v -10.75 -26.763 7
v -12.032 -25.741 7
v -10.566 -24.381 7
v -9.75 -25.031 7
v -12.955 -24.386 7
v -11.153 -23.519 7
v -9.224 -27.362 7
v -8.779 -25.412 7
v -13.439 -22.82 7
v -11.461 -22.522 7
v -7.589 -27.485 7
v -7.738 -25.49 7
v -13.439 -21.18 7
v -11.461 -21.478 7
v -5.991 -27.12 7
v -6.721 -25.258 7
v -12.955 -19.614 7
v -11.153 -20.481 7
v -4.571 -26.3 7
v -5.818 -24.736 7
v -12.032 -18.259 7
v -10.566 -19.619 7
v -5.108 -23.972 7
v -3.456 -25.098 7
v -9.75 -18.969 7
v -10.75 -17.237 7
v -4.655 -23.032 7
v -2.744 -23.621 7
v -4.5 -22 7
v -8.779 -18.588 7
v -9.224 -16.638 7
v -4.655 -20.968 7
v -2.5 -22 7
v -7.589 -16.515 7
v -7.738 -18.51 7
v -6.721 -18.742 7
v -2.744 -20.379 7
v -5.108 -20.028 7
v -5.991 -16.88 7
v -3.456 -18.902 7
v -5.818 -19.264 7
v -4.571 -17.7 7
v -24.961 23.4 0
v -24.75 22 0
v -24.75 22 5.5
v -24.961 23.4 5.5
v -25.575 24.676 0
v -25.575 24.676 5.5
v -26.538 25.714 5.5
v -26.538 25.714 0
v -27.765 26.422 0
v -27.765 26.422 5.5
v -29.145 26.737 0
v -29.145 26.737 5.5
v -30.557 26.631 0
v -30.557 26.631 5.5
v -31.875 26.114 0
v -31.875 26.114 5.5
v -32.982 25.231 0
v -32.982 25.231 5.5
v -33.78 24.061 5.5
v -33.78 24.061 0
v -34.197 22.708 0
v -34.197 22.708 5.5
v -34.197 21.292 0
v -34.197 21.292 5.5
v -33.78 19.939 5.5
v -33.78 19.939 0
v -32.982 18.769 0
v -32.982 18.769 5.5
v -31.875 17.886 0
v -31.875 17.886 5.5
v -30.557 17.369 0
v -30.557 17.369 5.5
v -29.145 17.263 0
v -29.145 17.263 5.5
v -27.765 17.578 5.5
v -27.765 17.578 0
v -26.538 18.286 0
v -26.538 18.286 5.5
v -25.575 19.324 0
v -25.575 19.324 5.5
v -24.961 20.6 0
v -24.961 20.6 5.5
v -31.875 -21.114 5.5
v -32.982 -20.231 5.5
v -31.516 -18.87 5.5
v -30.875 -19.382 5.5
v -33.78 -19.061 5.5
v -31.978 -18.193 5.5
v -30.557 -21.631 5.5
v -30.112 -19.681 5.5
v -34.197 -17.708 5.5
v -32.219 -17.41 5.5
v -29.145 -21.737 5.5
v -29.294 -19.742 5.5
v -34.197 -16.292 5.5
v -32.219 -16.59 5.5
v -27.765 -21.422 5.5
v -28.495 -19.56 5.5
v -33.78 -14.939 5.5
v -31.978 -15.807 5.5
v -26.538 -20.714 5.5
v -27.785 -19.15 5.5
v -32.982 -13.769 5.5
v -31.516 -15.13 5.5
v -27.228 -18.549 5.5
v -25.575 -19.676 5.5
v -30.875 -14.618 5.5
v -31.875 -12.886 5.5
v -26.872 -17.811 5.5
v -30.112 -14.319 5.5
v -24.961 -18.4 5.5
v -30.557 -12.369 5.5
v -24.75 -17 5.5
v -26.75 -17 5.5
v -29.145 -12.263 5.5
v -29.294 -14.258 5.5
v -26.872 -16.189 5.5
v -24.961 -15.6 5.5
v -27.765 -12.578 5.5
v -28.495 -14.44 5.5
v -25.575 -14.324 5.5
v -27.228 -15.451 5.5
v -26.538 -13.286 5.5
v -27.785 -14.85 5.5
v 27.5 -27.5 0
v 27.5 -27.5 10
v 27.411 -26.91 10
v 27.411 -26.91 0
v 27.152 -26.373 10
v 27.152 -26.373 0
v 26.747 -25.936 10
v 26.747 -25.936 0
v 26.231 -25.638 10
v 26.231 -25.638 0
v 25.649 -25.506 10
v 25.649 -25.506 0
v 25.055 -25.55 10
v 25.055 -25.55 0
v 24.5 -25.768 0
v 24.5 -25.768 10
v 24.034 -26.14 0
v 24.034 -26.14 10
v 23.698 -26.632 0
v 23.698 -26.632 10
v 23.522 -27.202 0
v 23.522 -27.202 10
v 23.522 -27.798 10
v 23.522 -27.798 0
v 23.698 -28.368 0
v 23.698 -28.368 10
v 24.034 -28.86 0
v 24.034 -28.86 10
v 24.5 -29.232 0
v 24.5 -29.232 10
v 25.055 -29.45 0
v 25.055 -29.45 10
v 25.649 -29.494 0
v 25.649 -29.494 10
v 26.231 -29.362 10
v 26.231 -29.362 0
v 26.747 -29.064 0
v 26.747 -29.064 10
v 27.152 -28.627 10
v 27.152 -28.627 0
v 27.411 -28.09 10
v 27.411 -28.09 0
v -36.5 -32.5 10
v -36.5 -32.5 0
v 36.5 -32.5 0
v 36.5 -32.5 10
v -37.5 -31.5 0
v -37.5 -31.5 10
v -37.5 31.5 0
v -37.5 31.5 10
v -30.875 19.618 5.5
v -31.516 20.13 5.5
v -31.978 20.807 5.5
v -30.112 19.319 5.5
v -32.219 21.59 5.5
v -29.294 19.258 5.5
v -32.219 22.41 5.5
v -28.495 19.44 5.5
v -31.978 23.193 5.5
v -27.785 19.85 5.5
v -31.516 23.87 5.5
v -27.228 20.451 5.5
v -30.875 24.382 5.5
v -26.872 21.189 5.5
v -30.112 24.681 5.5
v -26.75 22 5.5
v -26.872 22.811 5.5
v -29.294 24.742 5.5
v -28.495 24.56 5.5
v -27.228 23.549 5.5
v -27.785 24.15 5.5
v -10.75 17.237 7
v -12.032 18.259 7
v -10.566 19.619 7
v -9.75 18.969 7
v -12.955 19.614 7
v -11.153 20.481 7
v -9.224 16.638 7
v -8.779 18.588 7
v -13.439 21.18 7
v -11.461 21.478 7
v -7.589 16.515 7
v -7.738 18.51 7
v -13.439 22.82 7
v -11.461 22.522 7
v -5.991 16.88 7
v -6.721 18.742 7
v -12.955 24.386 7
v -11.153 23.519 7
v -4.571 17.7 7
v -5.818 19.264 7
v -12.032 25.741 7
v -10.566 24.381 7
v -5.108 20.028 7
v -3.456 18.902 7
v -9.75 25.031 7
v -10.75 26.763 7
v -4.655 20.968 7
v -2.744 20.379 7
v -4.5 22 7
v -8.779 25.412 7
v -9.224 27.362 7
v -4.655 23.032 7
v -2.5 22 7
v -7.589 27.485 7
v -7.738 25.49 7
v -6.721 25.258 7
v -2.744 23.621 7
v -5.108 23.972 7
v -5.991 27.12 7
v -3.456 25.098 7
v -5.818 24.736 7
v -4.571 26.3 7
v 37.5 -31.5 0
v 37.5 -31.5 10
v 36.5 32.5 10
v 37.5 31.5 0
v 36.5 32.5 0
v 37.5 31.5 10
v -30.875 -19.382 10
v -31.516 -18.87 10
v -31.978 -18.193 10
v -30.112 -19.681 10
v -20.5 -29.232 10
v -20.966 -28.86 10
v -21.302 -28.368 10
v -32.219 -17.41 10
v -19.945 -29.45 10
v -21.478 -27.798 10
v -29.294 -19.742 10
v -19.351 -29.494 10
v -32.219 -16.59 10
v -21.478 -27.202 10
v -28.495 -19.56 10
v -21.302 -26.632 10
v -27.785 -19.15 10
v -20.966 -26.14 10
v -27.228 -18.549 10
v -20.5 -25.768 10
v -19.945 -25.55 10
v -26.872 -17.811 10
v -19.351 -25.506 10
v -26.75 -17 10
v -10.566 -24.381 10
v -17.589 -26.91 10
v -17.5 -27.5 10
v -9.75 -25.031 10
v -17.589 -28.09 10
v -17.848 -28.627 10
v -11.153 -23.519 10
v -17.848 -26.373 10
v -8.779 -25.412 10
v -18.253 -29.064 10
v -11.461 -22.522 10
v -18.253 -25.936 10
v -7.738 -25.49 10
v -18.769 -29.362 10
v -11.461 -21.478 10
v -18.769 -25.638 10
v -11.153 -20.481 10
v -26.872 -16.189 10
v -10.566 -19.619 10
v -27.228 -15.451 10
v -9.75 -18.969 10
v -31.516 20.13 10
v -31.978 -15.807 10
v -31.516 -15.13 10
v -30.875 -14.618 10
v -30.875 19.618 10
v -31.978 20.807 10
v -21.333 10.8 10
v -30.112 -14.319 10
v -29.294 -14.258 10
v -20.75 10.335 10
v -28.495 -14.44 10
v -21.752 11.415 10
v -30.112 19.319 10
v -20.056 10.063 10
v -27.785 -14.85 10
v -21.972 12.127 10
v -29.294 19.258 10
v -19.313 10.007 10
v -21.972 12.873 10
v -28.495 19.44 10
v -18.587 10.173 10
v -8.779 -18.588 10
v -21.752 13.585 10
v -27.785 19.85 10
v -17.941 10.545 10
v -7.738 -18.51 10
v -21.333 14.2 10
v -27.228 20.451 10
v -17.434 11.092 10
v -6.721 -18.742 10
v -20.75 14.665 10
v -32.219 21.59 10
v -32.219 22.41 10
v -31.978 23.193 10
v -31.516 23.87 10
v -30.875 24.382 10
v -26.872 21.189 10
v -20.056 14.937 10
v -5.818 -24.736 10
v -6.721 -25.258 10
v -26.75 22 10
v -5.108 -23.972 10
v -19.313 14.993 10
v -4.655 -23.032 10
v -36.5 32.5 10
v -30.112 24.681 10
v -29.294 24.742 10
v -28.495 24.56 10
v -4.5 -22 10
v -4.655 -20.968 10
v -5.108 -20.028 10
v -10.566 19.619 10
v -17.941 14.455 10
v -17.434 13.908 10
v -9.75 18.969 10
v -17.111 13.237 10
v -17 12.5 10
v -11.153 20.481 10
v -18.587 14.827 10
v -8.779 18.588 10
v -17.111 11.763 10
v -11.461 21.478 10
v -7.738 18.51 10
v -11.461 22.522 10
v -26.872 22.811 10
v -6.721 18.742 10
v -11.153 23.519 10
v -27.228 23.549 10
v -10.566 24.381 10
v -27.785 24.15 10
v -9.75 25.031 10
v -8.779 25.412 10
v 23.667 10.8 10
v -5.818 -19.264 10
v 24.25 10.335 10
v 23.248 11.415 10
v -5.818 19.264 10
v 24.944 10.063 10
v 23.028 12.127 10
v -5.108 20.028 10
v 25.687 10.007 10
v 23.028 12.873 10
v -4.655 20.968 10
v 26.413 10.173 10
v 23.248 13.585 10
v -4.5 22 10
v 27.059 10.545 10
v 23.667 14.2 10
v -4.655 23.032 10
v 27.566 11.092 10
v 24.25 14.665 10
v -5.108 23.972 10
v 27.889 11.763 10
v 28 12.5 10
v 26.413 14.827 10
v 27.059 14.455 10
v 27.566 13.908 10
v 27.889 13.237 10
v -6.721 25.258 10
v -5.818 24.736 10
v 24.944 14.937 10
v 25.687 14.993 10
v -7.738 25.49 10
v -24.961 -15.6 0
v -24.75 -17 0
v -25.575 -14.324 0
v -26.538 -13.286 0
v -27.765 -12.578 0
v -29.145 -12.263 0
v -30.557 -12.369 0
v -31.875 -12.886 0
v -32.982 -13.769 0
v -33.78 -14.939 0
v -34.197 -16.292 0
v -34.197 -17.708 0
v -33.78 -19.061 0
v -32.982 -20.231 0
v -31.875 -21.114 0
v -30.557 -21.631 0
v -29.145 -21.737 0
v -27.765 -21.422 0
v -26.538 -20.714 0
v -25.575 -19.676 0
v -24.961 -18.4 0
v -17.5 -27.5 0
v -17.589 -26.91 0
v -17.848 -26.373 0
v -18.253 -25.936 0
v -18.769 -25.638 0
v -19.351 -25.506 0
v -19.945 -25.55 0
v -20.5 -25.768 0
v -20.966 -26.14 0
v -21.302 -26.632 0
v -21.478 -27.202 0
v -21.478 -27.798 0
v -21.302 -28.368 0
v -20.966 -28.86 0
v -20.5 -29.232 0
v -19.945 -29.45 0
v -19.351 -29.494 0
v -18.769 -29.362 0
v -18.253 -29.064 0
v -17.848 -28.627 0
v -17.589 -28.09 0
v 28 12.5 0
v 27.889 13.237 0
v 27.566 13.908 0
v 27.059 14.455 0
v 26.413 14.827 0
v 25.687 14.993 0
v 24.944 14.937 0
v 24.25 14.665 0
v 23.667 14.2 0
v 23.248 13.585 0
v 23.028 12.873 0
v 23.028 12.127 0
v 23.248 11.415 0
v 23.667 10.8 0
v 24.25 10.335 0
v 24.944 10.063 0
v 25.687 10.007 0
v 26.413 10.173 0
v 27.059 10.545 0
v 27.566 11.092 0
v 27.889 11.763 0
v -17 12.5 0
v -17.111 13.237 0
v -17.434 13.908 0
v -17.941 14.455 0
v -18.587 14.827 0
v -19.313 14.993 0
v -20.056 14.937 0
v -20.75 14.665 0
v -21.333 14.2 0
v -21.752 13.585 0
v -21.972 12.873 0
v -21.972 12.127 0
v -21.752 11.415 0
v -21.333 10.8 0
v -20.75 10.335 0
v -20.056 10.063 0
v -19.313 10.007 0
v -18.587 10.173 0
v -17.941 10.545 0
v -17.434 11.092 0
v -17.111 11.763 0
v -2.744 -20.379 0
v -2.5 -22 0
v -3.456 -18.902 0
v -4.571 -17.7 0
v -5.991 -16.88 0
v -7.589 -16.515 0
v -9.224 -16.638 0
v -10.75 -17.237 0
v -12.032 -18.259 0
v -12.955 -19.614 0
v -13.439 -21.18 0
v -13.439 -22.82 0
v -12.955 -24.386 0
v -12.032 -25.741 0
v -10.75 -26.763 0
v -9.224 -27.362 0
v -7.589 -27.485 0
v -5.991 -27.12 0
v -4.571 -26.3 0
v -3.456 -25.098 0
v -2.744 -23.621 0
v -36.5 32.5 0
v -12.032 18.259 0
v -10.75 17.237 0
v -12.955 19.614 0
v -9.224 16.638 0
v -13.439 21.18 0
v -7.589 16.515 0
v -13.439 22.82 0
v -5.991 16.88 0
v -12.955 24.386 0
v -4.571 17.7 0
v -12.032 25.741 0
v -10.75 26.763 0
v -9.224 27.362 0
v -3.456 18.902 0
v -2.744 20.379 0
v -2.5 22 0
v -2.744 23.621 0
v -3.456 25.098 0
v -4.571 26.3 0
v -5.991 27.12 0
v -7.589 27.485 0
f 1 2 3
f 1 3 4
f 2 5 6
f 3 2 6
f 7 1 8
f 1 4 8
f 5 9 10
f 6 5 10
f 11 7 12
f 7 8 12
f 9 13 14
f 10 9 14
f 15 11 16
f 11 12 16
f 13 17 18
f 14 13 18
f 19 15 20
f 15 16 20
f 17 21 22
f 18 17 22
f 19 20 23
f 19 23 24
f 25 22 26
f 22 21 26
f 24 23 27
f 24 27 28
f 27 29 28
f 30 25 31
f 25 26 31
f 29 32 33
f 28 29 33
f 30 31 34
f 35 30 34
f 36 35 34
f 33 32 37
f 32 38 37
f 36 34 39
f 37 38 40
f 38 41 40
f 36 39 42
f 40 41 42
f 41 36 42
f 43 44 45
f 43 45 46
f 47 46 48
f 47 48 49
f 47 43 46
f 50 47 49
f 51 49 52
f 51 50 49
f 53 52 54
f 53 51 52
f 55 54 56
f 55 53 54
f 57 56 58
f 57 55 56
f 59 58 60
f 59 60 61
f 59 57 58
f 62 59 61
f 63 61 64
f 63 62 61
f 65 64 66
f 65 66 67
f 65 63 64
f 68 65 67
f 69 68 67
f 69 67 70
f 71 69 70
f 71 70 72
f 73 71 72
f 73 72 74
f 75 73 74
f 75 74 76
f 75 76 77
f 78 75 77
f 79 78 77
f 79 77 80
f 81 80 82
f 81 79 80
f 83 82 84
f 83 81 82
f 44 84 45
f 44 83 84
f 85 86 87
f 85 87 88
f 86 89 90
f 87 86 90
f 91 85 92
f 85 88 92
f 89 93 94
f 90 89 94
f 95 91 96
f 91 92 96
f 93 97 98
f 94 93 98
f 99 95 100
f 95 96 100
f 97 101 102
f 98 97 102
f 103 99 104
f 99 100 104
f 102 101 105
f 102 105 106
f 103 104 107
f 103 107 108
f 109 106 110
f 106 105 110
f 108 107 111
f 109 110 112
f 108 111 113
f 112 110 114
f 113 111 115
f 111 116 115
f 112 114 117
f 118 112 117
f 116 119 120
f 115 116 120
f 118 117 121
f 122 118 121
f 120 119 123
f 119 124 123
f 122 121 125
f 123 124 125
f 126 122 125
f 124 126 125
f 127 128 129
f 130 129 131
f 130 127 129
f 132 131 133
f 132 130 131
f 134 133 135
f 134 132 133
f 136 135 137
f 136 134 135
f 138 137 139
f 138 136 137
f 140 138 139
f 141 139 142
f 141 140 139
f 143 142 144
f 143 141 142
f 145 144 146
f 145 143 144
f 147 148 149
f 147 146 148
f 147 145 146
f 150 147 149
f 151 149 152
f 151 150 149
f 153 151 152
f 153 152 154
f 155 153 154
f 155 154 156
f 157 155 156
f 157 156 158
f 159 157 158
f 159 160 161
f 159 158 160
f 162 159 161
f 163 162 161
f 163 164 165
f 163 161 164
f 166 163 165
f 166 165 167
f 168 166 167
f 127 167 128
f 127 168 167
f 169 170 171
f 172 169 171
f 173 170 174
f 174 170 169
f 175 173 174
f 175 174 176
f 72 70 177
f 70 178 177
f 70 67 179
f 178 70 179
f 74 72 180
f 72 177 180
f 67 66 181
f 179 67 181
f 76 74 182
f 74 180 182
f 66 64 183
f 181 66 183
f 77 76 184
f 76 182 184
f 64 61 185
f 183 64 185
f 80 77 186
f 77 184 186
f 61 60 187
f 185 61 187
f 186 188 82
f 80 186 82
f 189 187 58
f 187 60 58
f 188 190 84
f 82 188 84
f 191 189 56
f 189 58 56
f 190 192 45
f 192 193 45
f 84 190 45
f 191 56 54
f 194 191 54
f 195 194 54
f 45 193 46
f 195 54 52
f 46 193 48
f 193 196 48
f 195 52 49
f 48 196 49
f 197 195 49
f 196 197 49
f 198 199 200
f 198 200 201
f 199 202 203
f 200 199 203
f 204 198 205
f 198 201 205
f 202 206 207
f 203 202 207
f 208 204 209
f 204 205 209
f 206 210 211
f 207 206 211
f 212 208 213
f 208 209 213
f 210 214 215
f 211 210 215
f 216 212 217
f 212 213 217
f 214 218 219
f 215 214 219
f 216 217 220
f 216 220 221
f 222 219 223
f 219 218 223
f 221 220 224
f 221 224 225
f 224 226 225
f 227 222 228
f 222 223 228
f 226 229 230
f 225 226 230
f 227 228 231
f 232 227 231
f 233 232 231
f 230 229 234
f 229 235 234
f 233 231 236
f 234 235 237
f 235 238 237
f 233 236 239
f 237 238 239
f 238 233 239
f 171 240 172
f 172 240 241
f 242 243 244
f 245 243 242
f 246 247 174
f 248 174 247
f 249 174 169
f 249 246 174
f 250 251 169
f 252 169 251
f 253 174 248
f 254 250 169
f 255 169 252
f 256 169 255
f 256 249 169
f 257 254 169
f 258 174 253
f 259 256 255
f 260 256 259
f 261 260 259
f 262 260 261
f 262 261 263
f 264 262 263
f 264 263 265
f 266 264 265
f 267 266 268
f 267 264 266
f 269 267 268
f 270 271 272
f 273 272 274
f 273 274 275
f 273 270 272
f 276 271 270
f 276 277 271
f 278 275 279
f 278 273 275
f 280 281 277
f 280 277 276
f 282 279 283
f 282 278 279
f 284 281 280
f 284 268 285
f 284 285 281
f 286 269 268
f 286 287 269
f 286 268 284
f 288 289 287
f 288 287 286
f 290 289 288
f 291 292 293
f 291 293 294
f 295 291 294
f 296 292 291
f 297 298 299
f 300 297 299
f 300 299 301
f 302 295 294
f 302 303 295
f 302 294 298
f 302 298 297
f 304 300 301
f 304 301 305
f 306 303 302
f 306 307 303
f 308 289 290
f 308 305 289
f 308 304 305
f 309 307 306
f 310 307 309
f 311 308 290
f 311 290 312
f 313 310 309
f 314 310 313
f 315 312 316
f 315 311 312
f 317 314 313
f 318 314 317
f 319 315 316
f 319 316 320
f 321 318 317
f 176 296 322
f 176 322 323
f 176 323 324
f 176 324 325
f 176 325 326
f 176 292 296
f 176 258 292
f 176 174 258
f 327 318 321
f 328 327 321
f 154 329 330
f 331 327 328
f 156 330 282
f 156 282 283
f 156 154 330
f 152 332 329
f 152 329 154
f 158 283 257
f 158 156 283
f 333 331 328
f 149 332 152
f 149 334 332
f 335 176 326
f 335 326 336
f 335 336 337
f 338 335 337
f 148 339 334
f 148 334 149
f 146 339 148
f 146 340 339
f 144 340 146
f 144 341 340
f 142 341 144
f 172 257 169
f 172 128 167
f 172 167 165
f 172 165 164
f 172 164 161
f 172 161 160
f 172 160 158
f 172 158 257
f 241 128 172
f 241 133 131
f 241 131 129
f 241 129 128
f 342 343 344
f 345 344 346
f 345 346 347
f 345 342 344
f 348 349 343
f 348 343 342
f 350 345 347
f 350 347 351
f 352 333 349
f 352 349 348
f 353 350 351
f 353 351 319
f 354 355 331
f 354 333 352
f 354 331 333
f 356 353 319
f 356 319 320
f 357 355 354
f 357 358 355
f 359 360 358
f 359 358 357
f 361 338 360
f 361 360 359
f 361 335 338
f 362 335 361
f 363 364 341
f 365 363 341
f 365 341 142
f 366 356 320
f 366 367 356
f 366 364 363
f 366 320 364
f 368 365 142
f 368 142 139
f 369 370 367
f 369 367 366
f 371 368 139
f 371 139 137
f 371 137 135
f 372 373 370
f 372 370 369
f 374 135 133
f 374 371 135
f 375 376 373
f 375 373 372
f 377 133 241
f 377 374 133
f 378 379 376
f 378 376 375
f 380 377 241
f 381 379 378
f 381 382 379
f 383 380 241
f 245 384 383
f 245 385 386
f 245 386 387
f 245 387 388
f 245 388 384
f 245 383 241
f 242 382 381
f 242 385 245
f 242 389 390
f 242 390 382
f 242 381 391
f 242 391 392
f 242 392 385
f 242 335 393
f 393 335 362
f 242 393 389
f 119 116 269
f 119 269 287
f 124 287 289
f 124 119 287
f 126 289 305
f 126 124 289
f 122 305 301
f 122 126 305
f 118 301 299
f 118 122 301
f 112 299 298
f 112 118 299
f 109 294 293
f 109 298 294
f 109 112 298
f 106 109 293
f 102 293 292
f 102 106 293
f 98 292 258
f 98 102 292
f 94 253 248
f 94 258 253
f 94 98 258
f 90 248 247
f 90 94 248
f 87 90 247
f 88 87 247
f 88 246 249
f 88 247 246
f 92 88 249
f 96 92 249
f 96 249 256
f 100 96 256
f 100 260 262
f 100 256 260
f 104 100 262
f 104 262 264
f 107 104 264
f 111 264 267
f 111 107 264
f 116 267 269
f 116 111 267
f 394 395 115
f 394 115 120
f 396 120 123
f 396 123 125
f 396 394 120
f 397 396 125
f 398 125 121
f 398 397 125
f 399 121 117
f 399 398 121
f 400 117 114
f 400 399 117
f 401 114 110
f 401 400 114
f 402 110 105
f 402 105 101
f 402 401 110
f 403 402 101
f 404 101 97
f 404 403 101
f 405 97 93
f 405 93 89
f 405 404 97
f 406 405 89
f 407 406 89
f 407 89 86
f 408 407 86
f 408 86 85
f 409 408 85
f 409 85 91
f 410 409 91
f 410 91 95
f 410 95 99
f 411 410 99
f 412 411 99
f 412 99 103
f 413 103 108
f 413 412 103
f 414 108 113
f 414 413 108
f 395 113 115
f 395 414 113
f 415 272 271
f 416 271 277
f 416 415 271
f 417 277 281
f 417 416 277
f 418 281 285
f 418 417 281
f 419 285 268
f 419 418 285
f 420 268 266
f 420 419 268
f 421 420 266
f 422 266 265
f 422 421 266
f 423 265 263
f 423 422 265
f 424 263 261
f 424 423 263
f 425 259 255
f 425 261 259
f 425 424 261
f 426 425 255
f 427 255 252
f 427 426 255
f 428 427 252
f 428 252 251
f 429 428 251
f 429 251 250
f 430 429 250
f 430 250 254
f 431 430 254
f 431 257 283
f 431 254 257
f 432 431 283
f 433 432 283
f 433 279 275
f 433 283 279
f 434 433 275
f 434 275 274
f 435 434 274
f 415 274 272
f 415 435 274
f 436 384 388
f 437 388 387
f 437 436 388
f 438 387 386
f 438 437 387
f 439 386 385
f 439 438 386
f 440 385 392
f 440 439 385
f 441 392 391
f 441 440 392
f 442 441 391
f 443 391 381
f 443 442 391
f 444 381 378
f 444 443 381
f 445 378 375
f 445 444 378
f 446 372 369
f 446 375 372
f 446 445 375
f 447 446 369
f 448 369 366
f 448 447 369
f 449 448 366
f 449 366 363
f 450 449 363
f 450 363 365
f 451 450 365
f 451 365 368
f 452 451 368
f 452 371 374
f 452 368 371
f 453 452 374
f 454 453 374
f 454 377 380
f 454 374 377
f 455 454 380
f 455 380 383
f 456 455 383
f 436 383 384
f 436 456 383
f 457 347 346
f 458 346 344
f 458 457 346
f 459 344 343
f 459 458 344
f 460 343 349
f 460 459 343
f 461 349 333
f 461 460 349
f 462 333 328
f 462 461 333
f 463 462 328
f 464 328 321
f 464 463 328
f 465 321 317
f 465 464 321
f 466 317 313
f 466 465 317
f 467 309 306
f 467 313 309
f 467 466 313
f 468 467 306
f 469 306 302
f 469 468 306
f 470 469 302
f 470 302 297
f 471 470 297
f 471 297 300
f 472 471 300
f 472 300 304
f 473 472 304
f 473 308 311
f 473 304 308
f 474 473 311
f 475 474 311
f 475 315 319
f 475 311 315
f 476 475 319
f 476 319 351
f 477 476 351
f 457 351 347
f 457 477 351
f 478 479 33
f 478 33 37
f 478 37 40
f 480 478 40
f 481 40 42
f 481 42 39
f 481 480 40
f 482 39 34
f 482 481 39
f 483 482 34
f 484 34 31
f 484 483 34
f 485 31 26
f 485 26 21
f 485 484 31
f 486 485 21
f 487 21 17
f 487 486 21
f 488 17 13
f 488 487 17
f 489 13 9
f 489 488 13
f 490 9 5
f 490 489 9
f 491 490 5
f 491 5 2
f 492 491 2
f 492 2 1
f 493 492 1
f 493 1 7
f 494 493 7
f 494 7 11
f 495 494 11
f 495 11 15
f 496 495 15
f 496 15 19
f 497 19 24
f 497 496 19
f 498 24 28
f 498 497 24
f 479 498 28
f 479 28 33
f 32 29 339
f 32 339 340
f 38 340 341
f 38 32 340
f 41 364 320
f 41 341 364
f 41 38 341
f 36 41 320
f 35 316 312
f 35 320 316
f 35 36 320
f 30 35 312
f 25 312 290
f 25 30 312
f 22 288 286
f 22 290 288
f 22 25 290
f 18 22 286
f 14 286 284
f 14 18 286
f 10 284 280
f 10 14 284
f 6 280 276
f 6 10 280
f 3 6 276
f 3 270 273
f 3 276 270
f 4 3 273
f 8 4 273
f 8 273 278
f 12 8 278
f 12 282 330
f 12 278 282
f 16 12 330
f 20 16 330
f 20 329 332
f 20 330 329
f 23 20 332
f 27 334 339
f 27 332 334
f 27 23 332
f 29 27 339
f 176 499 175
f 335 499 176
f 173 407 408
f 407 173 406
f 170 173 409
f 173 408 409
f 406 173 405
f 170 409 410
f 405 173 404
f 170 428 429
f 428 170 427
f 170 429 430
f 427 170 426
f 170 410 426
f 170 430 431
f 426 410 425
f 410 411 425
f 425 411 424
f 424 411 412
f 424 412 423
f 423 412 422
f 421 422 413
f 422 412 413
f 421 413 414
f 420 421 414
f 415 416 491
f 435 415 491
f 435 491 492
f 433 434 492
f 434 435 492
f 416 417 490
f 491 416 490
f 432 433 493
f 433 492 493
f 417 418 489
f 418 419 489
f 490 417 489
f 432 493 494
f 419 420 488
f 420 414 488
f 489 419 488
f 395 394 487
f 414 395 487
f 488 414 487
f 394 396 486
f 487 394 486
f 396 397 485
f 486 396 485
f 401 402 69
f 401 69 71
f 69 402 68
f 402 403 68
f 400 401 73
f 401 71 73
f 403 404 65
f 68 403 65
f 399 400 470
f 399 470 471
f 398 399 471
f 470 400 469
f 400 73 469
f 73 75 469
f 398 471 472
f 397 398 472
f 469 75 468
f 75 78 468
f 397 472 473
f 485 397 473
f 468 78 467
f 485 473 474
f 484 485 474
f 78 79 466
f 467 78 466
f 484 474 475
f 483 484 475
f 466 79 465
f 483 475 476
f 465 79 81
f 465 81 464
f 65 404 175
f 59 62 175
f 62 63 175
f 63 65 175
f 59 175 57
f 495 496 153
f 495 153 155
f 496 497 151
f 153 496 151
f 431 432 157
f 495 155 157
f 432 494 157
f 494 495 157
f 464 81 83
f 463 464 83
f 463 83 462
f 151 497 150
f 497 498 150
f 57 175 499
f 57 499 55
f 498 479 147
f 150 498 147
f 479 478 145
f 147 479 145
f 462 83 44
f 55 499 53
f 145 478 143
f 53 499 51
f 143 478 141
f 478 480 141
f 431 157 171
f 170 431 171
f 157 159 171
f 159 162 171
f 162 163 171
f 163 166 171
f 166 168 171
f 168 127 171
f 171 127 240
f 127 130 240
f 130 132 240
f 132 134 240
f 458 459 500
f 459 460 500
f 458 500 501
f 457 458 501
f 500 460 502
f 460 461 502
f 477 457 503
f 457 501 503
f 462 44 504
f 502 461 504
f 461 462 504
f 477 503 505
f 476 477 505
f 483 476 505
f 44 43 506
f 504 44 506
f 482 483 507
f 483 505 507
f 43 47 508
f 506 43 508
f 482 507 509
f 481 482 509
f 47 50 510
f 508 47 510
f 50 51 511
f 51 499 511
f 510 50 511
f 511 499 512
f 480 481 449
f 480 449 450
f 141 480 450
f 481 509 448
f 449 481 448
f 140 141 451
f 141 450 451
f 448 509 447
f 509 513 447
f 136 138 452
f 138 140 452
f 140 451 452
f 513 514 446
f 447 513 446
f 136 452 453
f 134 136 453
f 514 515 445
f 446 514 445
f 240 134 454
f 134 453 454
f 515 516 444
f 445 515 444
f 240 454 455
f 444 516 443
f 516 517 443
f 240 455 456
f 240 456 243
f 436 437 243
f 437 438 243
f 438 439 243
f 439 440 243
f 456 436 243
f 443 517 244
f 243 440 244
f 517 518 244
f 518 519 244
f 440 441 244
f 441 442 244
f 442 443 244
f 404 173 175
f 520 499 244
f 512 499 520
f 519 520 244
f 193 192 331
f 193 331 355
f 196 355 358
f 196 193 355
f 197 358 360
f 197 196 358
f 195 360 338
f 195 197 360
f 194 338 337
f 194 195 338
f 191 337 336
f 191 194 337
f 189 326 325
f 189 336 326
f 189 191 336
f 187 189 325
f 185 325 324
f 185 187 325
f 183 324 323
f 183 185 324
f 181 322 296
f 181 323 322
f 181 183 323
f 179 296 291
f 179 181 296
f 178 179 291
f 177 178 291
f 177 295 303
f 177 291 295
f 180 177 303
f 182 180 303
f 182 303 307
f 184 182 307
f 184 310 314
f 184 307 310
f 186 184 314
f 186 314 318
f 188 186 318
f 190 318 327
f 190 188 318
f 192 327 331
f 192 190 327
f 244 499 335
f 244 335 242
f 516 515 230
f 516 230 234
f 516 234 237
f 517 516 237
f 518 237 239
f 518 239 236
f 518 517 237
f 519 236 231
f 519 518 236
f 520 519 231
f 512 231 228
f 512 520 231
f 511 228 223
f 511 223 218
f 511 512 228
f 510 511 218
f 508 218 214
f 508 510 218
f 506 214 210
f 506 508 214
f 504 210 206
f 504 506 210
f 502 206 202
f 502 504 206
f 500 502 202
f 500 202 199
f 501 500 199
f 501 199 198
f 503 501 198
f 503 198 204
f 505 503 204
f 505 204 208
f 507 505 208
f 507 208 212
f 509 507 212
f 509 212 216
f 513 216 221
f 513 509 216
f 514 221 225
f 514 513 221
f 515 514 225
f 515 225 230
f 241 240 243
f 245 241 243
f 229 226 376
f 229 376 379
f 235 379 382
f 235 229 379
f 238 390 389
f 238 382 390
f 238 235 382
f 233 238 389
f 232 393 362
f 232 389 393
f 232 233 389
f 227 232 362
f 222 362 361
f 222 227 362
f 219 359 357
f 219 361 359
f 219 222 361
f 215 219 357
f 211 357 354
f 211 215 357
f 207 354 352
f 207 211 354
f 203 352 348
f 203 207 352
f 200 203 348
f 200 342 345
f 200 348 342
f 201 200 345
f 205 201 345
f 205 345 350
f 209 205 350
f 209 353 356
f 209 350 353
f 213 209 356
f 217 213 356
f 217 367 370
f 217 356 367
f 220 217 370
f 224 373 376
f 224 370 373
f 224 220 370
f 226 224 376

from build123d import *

# Parameters (mm, degrees)
F1_W      = 75
F1_H      = 65
F2_DEPTH  = 10
F3_R      = 5.5
F4_DEPTH  = 7
F5_R      = 4.75
F6_DEPTH  = 5.5
F7_R      = 3.5
F8_DEPTH  = 25
F9_R      = 2.75
F10_DEPTH = 25
F11_R     = 2
F11_R_2   = 2.5
F12_DEPTH = 25
F13_SIZE  = 1


with BuildPart() as f2:
    # F1 (on face) → F2 (new body)
    with BuildSketch(Plane.XY):
        Rectangle(F1_W, F1_H)
    extrude(amount=F2_DEPTH)

    # F3 (on face) → F4 (cut)
    with BuildSketch(Plane.XY):
        with Locations((-8, 22)):
            Circle(F3_R)
        with Locations((-8, -22)):
            Circle(F3_R)
    extrude(amount=F4_DEPTH, mode=Mode.SUBTRACT)

    # F5 (on face) → F6 (cut)
    with BuildSketch(Plane.XY):
        with Locations((-29.5, 22)):
            Circle(F5_R)
        with Locations((-29.5, -17)):
            Circle(F5_R)
    extrude(amount=F6_DEPTH, mode=Mode.SUBTRACT)

    # F7 (on face) → F8 (cut)
    with BuildSketch(Plane.XY):
        with Locations((-8, -22)):
            Circle(F7_R)
        with Locations((-8, 22)):
            Circle(F7_R)
    extrude(amount=F8_DEPTH, mode=Mode.SUBTRACT)

    # F9 (on face) → F10 (cut)
    with BuildSketch(Plane.XY):
        with Locations((-29.5, -17)):
            Circle(F9_R)
        with Locations((-29.5, 22)):
            Circle(F9_R)
    extrude(amount=F10_DEPTH, mode=Mode.SUBTRACT)

    # F11 (on face) → F12 (cut)
    with BuildSketch(Plane.XY):
        with Locations((-19.5, -27.5)):
            Circle(F11_R)
        with Locations((-19.5, 12.5)):
            Circle(F11_R_2)
        with Locations((25.5, -27.5)):
            Circle(F11_R)
        with Locations((25.5, 12.5)):
            Circle(F11_R_2)
    extrude(amount=F12_DEPTH, mode=Mode.SUBTRACT)

    # F13
    f13_edges = [f2.edges().sort_by_distance(p)[0] for p in [
        (-37.5, 32.5, 5),
        (-37.5, -32.5, 5),
        (37.5, -32.5, 5),
        (37.5, 32.5, 5),
    ]]
    chamfer(f13_edges, length=F13_SIZE)


solid = f2.part
